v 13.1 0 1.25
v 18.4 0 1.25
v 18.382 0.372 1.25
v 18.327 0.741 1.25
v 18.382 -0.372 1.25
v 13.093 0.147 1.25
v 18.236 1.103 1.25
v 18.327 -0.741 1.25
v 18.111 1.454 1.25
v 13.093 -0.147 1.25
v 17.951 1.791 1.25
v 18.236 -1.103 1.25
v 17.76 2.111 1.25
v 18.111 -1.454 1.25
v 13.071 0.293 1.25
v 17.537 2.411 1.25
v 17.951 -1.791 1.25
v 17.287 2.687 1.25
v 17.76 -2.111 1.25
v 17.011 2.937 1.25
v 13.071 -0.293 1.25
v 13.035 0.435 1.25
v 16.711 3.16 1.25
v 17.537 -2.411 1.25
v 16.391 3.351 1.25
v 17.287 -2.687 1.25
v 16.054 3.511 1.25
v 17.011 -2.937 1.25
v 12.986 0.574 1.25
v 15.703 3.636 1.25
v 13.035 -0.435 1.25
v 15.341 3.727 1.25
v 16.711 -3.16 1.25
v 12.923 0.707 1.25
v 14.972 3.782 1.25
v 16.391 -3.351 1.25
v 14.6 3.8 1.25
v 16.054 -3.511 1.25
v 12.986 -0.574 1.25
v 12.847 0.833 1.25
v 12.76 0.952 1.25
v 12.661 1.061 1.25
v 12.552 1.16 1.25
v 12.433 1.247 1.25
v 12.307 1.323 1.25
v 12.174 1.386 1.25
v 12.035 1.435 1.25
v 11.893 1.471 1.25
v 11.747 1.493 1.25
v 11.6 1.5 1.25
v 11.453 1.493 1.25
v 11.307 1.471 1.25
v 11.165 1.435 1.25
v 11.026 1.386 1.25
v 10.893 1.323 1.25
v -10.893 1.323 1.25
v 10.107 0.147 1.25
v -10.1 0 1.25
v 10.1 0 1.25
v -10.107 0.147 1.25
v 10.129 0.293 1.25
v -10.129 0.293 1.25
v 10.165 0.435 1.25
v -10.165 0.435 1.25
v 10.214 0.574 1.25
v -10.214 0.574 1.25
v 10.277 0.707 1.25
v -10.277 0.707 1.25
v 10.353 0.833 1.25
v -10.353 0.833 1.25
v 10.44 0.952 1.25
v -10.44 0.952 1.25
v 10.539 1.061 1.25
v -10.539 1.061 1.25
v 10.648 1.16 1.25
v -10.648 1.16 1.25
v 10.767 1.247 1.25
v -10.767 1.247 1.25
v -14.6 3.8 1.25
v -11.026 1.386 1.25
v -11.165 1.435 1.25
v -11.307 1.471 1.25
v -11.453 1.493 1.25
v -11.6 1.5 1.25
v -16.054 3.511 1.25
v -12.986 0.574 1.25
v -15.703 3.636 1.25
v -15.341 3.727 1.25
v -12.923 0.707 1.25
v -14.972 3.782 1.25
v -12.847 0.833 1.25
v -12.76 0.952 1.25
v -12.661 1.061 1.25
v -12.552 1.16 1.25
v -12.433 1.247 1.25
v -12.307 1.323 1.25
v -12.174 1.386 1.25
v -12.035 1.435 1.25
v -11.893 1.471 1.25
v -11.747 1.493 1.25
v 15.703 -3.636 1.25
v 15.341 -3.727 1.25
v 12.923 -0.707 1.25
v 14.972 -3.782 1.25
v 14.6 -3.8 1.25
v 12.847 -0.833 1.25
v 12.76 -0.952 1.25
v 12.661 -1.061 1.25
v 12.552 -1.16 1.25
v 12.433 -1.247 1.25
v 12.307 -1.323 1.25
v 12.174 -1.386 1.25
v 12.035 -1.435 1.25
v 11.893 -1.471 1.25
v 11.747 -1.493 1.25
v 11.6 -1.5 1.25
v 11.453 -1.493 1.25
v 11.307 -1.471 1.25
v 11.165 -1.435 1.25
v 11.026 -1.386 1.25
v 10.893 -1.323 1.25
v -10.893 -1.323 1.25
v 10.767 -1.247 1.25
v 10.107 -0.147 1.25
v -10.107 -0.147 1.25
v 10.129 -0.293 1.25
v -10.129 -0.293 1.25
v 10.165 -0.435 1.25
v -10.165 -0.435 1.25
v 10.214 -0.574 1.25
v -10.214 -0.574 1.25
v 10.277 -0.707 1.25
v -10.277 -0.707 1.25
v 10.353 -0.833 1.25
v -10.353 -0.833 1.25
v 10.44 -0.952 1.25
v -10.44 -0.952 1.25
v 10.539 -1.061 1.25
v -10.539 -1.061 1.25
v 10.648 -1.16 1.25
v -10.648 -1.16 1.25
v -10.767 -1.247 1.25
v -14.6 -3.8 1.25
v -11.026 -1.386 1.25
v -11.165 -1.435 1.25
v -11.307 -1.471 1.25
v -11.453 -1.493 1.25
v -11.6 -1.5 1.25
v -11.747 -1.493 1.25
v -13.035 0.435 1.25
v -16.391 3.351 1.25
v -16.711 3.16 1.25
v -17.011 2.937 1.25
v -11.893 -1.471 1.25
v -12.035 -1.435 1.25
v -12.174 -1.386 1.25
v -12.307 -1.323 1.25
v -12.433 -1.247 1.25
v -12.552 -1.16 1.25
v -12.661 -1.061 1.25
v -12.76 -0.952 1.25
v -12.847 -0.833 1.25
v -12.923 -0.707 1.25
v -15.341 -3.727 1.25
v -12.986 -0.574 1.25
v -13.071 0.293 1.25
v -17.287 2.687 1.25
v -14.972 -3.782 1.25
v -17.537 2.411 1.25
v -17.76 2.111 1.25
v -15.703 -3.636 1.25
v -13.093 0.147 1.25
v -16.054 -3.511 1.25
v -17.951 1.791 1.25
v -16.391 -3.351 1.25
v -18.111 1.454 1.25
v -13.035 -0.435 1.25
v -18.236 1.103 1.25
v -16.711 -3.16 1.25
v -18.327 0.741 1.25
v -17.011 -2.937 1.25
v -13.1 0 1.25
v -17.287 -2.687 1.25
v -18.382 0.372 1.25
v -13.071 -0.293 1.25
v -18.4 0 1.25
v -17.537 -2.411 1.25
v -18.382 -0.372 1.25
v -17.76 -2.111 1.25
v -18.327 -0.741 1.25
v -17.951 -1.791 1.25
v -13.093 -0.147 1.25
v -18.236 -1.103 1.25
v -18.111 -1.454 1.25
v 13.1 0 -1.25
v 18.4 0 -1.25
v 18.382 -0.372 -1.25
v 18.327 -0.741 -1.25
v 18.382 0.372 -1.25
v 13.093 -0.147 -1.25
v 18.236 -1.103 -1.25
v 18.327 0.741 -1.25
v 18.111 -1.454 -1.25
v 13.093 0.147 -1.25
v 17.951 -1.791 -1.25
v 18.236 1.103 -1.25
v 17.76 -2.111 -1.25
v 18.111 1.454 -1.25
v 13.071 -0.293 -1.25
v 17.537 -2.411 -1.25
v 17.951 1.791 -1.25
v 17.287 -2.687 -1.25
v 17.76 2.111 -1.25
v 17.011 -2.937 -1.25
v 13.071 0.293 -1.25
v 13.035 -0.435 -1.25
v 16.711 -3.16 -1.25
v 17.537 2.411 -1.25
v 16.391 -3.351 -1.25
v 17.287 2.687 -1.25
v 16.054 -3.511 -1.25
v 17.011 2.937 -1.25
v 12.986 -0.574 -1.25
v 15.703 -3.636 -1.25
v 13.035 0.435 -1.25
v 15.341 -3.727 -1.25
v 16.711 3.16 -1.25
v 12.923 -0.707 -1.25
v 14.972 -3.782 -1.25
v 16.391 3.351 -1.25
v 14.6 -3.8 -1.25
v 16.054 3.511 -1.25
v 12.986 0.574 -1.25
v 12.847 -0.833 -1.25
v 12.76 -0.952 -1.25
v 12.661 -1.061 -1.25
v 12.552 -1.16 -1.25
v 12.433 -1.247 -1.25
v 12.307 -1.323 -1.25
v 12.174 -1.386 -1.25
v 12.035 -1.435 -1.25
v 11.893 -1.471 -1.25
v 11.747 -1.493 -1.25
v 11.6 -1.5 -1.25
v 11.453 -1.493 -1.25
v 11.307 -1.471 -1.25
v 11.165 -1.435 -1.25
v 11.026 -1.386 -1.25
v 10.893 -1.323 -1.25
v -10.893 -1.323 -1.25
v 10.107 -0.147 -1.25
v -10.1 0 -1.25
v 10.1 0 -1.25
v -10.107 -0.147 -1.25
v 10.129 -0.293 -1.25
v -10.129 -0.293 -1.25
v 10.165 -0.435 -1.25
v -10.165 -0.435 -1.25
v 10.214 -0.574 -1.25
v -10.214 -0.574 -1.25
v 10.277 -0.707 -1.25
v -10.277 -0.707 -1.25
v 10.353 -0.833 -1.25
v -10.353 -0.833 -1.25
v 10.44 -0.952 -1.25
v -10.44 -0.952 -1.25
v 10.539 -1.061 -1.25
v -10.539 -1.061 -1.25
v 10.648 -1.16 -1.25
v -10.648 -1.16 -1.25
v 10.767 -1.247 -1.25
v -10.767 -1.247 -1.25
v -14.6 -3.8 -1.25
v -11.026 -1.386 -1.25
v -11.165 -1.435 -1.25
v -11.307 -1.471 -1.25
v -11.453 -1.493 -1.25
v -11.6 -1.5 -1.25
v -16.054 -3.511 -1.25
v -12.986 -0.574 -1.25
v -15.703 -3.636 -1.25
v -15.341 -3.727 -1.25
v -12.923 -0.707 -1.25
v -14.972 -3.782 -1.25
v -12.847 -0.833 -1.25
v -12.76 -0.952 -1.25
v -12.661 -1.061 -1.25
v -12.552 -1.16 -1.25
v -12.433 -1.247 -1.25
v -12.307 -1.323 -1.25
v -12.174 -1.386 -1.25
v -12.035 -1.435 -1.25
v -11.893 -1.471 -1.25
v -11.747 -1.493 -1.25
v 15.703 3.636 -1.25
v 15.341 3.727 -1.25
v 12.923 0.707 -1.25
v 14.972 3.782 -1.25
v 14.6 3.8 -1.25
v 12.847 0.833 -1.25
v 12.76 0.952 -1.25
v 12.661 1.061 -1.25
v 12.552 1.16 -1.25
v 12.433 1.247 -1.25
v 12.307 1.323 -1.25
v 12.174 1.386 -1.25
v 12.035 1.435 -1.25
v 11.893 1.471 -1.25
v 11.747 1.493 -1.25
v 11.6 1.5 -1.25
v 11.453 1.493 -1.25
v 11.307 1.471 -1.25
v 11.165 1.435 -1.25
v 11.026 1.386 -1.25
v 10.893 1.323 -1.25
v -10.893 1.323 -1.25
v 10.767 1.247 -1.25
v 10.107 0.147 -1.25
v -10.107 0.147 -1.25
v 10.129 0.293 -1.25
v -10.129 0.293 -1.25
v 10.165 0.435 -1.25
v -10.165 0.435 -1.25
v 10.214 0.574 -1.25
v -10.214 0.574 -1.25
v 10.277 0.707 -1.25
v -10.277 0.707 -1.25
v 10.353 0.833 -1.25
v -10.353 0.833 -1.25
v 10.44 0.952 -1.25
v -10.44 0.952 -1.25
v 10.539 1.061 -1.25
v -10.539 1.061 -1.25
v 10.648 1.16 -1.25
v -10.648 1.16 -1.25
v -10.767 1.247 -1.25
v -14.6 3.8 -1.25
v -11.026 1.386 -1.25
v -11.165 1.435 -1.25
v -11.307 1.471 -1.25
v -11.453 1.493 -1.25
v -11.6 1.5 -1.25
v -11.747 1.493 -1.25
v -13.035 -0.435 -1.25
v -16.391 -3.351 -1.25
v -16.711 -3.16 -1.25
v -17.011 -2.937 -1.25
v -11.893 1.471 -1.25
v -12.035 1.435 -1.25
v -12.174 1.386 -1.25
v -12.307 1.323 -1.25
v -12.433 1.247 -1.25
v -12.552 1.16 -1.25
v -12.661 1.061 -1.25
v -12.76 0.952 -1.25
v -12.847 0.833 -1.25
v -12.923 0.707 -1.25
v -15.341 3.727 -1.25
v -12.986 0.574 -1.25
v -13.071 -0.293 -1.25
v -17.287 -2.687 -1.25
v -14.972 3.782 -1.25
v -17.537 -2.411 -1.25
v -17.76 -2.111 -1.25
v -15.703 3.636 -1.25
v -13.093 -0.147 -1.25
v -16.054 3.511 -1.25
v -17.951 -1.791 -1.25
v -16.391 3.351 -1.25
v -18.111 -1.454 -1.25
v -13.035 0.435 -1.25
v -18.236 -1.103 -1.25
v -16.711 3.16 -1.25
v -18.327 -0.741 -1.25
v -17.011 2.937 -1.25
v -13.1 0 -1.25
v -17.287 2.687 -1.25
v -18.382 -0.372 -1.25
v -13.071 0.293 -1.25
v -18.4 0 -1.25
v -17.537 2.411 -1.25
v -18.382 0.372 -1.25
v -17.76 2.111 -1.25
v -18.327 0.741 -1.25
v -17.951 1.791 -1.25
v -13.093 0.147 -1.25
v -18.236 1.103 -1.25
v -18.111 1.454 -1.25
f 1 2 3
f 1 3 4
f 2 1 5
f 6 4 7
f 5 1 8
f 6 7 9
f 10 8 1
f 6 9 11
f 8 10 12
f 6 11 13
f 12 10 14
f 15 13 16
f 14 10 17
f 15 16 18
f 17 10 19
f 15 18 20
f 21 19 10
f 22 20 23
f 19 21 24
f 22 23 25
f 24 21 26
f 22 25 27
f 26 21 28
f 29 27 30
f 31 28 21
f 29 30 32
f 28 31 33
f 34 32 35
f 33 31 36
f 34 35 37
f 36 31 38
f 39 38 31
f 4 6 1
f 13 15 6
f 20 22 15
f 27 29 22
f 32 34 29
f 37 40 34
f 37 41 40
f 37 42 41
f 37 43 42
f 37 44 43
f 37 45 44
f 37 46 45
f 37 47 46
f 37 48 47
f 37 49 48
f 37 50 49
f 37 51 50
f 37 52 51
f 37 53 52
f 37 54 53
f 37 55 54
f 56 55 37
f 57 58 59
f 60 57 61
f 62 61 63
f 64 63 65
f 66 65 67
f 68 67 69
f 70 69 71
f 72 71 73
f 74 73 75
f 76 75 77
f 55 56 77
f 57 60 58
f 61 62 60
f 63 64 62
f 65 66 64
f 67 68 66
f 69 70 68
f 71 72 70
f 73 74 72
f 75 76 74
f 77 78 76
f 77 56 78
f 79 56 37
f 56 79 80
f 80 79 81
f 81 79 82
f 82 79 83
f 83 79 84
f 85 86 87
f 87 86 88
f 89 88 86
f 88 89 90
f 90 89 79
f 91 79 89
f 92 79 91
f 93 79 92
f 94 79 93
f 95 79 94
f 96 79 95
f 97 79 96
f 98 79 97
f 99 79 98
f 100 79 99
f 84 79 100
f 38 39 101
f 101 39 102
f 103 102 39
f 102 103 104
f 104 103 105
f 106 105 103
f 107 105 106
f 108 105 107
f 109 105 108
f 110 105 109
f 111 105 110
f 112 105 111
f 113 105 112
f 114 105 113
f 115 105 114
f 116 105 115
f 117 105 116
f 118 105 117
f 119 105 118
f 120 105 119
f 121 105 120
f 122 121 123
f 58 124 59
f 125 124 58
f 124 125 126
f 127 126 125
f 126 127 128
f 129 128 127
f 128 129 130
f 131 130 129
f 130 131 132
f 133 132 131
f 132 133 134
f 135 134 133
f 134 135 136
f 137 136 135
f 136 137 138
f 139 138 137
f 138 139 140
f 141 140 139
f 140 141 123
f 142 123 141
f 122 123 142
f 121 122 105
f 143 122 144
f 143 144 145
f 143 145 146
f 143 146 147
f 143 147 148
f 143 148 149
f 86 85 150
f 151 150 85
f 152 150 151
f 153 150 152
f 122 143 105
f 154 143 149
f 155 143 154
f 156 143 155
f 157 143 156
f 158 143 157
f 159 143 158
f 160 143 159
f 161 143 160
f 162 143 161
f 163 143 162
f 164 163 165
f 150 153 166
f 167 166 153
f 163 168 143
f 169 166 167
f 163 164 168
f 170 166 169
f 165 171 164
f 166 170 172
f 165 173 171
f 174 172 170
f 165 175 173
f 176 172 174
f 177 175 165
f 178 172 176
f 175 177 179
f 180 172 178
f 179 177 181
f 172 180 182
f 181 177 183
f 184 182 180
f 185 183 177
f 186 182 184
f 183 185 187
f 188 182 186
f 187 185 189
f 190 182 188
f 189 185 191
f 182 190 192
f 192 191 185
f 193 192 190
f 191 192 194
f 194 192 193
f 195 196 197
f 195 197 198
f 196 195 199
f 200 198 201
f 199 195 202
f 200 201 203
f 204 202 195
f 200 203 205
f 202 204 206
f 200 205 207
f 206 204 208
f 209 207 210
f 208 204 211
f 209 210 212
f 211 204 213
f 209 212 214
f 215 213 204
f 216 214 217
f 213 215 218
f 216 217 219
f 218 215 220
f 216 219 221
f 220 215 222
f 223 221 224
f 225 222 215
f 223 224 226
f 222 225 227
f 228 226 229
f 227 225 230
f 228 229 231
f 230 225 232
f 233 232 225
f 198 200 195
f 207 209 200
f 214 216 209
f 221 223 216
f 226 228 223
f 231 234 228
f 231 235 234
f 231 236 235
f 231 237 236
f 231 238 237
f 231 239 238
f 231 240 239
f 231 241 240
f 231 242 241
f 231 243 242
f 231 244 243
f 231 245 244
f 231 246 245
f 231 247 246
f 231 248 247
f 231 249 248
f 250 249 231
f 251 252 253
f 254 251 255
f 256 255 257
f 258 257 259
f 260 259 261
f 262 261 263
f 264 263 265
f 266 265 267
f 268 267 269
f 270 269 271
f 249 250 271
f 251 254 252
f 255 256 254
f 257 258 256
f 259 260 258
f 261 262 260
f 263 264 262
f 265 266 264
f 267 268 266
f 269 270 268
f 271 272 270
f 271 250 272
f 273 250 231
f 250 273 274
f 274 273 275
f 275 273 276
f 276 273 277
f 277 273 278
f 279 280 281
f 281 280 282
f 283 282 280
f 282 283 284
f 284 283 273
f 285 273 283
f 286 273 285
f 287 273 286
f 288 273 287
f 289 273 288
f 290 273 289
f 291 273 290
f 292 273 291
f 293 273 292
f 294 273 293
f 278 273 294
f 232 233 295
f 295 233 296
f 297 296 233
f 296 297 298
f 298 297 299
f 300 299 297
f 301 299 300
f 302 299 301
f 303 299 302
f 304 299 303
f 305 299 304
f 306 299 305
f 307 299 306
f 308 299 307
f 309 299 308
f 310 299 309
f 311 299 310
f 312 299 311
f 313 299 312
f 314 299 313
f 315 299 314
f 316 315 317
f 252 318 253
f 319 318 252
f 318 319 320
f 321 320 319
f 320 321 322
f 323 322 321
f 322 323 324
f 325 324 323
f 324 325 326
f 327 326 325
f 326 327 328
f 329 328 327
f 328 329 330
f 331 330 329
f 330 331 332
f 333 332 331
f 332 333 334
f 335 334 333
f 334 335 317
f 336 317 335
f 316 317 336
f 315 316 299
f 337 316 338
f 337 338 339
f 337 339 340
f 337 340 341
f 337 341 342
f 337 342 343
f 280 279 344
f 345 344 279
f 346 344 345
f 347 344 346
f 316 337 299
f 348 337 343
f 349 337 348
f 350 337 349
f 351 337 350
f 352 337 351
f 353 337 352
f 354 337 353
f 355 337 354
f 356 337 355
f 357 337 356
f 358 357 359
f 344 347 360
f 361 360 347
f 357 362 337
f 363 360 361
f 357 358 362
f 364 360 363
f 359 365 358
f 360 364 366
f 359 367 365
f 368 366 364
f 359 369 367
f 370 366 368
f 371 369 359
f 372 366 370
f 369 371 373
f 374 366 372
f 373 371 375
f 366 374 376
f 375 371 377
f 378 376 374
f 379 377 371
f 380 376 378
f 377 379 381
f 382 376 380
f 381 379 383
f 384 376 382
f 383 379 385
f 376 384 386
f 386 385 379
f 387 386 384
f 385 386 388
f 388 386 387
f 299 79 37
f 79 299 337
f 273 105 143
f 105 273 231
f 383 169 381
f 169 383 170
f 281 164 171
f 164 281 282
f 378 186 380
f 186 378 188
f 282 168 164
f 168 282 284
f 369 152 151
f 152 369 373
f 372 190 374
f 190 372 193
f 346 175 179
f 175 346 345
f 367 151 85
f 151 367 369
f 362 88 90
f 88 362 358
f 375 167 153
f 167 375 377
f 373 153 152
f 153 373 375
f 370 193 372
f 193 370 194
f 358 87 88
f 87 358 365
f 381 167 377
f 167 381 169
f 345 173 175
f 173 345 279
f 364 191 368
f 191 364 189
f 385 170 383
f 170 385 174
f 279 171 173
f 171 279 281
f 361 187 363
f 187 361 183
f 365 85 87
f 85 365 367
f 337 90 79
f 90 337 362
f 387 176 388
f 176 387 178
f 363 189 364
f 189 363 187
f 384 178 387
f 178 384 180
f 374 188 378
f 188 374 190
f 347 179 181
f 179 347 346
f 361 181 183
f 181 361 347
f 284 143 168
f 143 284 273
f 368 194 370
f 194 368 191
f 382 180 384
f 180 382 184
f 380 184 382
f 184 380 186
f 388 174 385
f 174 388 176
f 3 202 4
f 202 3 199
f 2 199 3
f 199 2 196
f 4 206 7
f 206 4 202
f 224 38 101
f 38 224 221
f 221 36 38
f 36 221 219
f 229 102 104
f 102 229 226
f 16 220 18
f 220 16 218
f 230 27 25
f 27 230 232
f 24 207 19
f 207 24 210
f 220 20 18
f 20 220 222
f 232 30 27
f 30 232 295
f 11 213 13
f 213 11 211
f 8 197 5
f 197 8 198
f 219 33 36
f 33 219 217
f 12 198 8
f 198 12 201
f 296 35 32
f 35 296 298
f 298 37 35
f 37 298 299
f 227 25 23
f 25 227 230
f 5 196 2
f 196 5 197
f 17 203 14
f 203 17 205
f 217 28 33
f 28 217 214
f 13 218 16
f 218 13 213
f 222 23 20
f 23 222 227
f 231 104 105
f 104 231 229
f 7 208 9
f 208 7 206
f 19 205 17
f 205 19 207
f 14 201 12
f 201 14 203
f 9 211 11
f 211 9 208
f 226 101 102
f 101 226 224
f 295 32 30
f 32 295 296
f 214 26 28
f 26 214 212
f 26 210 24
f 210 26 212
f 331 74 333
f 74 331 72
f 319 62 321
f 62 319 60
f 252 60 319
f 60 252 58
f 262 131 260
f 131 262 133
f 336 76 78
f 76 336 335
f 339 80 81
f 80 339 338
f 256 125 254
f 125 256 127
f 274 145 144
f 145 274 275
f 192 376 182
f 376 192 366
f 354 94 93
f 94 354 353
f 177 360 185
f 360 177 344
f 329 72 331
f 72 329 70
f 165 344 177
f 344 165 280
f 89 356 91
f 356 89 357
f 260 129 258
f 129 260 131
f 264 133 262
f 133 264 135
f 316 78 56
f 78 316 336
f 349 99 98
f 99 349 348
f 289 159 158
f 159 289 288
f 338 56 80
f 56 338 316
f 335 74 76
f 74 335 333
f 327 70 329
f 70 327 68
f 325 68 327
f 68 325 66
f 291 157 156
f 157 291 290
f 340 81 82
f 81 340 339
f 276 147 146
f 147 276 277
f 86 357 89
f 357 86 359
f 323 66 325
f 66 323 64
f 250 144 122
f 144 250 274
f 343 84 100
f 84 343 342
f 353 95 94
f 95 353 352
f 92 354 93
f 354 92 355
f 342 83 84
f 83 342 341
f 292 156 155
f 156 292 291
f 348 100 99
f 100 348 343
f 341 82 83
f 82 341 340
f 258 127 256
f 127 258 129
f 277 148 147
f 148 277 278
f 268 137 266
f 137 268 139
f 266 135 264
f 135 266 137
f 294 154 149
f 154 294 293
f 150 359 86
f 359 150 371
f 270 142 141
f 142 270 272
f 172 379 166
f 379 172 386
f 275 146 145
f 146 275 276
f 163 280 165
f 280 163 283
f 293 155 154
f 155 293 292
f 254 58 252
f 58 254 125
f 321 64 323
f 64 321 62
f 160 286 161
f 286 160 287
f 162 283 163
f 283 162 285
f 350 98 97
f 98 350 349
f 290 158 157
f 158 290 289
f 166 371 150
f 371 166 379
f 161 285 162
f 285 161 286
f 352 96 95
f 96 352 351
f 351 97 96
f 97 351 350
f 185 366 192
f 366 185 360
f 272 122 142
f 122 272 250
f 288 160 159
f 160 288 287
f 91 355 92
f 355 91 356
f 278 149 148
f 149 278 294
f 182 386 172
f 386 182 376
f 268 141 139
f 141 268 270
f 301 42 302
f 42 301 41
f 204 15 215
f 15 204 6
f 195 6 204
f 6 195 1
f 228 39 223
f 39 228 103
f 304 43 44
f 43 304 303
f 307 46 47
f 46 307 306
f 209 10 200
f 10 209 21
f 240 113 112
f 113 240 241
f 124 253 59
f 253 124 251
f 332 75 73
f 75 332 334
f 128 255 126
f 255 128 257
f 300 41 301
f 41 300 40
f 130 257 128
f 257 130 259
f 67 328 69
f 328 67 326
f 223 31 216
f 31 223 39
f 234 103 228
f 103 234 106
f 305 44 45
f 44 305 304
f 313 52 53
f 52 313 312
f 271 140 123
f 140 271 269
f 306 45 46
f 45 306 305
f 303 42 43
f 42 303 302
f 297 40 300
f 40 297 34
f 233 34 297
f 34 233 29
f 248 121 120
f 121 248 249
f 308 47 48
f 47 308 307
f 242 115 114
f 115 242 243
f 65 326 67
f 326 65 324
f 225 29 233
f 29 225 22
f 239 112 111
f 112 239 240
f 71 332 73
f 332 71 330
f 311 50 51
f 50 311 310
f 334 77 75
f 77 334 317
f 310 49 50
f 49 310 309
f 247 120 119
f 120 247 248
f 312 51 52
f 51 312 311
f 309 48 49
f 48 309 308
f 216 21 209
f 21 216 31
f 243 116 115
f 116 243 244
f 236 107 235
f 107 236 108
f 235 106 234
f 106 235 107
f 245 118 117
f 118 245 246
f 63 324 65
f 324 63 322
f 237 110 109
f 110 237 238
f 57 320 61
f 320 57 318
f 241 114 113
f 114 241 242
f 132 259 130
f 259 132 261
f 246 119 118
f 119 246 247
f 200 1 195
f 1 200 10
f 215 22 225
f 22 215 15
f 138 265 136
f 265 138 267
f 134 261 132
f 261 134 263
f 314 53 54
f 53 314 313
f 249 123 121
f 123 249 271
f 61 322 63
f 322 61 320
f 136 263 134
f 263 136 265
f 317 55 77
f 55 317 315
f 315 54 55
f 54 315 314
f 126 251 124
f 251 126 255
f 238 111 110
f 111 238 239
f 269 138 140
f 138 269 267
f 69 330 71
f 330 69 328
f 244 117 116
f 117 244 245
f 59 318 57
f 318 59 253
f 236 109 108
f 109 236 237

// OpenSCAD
module link_plate() {
    difference() {
        // Main capsule shape
        union() {
            // Central rectangular part
            cube([29.2, 7.6, 2.5], center=true);
            // Rounded ends
            translate([-14.6, 0, 0])
                cylinder(h=2.5, r=3.8, $fn=64, center=true);
            translate([14.6, 0, 0])
                cylinder(h=2.5, r=3.8, $fn=64, center=true);
        }
        // Holes
        translate([-11.6, 0, 0])
            cylinder(h=3, r=1.5, $fn=64, center=true);
        translate([11.6, 0, 0])
            cylinder(h=3, r=1.5, $fn=64, center=true);
    }
}

link_plate();
